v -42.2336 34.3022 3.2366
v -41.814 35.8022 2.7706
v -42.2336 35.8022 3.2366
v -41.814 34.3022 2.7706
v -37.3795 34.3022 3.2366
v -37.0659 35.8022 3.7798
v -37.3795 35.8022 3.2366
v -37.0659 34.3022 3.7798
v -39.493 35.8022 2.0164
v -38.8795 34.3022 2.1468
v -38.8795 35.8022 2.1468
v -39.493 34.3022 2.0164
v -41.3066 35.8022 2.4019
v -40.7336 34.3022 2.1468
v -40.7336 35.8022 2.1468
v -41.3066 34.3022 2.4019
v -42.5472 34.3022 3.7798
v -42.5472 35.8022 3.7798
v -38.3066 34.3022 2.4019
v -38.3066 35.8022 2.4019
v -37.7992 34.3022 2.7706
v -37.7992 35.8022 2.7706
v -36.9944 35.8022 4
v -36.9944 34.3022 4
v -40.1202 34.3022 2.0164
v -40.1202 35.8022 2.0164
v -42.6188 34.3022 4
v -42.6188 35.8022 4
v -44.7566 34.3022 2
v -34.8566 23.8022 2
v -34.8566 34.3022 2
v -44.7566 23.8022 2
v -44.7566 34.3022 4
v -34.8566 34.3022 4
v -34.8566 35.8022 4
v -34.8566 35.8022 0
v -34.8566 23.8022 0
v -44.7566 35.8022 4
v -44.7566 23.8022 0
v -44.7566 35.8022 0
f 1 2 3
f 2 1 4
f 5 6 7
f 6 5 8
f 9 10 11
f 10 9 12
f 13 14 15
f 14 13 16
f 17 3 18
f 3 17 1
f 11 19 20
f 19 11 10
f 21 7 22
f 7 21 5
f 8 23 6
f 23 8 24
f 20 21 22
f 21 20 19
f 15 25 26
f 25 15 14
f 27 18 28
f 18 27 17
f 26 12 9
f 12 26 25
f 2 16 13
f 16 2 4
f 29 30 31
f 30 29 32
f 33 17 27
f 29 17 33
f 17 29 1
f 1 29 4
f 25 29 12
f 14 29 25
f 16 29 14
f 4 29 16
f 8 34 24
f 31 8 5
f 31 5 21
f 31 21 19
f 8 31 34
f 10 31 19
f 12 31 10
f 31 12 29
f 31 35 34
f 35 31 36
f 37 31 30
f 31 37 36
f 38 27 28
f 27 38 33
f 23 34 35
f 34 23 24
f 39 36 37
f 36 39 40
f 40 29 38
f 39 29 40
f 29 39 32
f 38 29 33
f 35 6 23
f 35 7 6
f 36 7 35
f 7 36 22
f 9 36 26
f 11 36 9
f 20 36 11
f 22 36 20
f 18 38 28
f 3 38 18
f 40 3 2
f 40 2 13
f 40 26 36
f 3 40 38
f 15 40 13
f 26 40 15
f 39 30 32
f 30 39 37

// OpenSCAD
difference () {
  union () {
    translate ([-39.80658416442557, 29.802167776611448, 2]) {
      cube ([9.9, 12, 4], center=true);
    }
  }
  union () {
    translate ([-39.80658416442557, 35.80216777661145, 5]) {
      rotate (a=90.0, v=[1, 0, 0]) {
        cylinder ($fn=30, h=20, r=3, center=true);
      }
    }
    translate ([-39.80658416442557, 28.802167776611448, 11/2]) {
      cube ([11, 11, 7], center=true);
    }
  }
}
